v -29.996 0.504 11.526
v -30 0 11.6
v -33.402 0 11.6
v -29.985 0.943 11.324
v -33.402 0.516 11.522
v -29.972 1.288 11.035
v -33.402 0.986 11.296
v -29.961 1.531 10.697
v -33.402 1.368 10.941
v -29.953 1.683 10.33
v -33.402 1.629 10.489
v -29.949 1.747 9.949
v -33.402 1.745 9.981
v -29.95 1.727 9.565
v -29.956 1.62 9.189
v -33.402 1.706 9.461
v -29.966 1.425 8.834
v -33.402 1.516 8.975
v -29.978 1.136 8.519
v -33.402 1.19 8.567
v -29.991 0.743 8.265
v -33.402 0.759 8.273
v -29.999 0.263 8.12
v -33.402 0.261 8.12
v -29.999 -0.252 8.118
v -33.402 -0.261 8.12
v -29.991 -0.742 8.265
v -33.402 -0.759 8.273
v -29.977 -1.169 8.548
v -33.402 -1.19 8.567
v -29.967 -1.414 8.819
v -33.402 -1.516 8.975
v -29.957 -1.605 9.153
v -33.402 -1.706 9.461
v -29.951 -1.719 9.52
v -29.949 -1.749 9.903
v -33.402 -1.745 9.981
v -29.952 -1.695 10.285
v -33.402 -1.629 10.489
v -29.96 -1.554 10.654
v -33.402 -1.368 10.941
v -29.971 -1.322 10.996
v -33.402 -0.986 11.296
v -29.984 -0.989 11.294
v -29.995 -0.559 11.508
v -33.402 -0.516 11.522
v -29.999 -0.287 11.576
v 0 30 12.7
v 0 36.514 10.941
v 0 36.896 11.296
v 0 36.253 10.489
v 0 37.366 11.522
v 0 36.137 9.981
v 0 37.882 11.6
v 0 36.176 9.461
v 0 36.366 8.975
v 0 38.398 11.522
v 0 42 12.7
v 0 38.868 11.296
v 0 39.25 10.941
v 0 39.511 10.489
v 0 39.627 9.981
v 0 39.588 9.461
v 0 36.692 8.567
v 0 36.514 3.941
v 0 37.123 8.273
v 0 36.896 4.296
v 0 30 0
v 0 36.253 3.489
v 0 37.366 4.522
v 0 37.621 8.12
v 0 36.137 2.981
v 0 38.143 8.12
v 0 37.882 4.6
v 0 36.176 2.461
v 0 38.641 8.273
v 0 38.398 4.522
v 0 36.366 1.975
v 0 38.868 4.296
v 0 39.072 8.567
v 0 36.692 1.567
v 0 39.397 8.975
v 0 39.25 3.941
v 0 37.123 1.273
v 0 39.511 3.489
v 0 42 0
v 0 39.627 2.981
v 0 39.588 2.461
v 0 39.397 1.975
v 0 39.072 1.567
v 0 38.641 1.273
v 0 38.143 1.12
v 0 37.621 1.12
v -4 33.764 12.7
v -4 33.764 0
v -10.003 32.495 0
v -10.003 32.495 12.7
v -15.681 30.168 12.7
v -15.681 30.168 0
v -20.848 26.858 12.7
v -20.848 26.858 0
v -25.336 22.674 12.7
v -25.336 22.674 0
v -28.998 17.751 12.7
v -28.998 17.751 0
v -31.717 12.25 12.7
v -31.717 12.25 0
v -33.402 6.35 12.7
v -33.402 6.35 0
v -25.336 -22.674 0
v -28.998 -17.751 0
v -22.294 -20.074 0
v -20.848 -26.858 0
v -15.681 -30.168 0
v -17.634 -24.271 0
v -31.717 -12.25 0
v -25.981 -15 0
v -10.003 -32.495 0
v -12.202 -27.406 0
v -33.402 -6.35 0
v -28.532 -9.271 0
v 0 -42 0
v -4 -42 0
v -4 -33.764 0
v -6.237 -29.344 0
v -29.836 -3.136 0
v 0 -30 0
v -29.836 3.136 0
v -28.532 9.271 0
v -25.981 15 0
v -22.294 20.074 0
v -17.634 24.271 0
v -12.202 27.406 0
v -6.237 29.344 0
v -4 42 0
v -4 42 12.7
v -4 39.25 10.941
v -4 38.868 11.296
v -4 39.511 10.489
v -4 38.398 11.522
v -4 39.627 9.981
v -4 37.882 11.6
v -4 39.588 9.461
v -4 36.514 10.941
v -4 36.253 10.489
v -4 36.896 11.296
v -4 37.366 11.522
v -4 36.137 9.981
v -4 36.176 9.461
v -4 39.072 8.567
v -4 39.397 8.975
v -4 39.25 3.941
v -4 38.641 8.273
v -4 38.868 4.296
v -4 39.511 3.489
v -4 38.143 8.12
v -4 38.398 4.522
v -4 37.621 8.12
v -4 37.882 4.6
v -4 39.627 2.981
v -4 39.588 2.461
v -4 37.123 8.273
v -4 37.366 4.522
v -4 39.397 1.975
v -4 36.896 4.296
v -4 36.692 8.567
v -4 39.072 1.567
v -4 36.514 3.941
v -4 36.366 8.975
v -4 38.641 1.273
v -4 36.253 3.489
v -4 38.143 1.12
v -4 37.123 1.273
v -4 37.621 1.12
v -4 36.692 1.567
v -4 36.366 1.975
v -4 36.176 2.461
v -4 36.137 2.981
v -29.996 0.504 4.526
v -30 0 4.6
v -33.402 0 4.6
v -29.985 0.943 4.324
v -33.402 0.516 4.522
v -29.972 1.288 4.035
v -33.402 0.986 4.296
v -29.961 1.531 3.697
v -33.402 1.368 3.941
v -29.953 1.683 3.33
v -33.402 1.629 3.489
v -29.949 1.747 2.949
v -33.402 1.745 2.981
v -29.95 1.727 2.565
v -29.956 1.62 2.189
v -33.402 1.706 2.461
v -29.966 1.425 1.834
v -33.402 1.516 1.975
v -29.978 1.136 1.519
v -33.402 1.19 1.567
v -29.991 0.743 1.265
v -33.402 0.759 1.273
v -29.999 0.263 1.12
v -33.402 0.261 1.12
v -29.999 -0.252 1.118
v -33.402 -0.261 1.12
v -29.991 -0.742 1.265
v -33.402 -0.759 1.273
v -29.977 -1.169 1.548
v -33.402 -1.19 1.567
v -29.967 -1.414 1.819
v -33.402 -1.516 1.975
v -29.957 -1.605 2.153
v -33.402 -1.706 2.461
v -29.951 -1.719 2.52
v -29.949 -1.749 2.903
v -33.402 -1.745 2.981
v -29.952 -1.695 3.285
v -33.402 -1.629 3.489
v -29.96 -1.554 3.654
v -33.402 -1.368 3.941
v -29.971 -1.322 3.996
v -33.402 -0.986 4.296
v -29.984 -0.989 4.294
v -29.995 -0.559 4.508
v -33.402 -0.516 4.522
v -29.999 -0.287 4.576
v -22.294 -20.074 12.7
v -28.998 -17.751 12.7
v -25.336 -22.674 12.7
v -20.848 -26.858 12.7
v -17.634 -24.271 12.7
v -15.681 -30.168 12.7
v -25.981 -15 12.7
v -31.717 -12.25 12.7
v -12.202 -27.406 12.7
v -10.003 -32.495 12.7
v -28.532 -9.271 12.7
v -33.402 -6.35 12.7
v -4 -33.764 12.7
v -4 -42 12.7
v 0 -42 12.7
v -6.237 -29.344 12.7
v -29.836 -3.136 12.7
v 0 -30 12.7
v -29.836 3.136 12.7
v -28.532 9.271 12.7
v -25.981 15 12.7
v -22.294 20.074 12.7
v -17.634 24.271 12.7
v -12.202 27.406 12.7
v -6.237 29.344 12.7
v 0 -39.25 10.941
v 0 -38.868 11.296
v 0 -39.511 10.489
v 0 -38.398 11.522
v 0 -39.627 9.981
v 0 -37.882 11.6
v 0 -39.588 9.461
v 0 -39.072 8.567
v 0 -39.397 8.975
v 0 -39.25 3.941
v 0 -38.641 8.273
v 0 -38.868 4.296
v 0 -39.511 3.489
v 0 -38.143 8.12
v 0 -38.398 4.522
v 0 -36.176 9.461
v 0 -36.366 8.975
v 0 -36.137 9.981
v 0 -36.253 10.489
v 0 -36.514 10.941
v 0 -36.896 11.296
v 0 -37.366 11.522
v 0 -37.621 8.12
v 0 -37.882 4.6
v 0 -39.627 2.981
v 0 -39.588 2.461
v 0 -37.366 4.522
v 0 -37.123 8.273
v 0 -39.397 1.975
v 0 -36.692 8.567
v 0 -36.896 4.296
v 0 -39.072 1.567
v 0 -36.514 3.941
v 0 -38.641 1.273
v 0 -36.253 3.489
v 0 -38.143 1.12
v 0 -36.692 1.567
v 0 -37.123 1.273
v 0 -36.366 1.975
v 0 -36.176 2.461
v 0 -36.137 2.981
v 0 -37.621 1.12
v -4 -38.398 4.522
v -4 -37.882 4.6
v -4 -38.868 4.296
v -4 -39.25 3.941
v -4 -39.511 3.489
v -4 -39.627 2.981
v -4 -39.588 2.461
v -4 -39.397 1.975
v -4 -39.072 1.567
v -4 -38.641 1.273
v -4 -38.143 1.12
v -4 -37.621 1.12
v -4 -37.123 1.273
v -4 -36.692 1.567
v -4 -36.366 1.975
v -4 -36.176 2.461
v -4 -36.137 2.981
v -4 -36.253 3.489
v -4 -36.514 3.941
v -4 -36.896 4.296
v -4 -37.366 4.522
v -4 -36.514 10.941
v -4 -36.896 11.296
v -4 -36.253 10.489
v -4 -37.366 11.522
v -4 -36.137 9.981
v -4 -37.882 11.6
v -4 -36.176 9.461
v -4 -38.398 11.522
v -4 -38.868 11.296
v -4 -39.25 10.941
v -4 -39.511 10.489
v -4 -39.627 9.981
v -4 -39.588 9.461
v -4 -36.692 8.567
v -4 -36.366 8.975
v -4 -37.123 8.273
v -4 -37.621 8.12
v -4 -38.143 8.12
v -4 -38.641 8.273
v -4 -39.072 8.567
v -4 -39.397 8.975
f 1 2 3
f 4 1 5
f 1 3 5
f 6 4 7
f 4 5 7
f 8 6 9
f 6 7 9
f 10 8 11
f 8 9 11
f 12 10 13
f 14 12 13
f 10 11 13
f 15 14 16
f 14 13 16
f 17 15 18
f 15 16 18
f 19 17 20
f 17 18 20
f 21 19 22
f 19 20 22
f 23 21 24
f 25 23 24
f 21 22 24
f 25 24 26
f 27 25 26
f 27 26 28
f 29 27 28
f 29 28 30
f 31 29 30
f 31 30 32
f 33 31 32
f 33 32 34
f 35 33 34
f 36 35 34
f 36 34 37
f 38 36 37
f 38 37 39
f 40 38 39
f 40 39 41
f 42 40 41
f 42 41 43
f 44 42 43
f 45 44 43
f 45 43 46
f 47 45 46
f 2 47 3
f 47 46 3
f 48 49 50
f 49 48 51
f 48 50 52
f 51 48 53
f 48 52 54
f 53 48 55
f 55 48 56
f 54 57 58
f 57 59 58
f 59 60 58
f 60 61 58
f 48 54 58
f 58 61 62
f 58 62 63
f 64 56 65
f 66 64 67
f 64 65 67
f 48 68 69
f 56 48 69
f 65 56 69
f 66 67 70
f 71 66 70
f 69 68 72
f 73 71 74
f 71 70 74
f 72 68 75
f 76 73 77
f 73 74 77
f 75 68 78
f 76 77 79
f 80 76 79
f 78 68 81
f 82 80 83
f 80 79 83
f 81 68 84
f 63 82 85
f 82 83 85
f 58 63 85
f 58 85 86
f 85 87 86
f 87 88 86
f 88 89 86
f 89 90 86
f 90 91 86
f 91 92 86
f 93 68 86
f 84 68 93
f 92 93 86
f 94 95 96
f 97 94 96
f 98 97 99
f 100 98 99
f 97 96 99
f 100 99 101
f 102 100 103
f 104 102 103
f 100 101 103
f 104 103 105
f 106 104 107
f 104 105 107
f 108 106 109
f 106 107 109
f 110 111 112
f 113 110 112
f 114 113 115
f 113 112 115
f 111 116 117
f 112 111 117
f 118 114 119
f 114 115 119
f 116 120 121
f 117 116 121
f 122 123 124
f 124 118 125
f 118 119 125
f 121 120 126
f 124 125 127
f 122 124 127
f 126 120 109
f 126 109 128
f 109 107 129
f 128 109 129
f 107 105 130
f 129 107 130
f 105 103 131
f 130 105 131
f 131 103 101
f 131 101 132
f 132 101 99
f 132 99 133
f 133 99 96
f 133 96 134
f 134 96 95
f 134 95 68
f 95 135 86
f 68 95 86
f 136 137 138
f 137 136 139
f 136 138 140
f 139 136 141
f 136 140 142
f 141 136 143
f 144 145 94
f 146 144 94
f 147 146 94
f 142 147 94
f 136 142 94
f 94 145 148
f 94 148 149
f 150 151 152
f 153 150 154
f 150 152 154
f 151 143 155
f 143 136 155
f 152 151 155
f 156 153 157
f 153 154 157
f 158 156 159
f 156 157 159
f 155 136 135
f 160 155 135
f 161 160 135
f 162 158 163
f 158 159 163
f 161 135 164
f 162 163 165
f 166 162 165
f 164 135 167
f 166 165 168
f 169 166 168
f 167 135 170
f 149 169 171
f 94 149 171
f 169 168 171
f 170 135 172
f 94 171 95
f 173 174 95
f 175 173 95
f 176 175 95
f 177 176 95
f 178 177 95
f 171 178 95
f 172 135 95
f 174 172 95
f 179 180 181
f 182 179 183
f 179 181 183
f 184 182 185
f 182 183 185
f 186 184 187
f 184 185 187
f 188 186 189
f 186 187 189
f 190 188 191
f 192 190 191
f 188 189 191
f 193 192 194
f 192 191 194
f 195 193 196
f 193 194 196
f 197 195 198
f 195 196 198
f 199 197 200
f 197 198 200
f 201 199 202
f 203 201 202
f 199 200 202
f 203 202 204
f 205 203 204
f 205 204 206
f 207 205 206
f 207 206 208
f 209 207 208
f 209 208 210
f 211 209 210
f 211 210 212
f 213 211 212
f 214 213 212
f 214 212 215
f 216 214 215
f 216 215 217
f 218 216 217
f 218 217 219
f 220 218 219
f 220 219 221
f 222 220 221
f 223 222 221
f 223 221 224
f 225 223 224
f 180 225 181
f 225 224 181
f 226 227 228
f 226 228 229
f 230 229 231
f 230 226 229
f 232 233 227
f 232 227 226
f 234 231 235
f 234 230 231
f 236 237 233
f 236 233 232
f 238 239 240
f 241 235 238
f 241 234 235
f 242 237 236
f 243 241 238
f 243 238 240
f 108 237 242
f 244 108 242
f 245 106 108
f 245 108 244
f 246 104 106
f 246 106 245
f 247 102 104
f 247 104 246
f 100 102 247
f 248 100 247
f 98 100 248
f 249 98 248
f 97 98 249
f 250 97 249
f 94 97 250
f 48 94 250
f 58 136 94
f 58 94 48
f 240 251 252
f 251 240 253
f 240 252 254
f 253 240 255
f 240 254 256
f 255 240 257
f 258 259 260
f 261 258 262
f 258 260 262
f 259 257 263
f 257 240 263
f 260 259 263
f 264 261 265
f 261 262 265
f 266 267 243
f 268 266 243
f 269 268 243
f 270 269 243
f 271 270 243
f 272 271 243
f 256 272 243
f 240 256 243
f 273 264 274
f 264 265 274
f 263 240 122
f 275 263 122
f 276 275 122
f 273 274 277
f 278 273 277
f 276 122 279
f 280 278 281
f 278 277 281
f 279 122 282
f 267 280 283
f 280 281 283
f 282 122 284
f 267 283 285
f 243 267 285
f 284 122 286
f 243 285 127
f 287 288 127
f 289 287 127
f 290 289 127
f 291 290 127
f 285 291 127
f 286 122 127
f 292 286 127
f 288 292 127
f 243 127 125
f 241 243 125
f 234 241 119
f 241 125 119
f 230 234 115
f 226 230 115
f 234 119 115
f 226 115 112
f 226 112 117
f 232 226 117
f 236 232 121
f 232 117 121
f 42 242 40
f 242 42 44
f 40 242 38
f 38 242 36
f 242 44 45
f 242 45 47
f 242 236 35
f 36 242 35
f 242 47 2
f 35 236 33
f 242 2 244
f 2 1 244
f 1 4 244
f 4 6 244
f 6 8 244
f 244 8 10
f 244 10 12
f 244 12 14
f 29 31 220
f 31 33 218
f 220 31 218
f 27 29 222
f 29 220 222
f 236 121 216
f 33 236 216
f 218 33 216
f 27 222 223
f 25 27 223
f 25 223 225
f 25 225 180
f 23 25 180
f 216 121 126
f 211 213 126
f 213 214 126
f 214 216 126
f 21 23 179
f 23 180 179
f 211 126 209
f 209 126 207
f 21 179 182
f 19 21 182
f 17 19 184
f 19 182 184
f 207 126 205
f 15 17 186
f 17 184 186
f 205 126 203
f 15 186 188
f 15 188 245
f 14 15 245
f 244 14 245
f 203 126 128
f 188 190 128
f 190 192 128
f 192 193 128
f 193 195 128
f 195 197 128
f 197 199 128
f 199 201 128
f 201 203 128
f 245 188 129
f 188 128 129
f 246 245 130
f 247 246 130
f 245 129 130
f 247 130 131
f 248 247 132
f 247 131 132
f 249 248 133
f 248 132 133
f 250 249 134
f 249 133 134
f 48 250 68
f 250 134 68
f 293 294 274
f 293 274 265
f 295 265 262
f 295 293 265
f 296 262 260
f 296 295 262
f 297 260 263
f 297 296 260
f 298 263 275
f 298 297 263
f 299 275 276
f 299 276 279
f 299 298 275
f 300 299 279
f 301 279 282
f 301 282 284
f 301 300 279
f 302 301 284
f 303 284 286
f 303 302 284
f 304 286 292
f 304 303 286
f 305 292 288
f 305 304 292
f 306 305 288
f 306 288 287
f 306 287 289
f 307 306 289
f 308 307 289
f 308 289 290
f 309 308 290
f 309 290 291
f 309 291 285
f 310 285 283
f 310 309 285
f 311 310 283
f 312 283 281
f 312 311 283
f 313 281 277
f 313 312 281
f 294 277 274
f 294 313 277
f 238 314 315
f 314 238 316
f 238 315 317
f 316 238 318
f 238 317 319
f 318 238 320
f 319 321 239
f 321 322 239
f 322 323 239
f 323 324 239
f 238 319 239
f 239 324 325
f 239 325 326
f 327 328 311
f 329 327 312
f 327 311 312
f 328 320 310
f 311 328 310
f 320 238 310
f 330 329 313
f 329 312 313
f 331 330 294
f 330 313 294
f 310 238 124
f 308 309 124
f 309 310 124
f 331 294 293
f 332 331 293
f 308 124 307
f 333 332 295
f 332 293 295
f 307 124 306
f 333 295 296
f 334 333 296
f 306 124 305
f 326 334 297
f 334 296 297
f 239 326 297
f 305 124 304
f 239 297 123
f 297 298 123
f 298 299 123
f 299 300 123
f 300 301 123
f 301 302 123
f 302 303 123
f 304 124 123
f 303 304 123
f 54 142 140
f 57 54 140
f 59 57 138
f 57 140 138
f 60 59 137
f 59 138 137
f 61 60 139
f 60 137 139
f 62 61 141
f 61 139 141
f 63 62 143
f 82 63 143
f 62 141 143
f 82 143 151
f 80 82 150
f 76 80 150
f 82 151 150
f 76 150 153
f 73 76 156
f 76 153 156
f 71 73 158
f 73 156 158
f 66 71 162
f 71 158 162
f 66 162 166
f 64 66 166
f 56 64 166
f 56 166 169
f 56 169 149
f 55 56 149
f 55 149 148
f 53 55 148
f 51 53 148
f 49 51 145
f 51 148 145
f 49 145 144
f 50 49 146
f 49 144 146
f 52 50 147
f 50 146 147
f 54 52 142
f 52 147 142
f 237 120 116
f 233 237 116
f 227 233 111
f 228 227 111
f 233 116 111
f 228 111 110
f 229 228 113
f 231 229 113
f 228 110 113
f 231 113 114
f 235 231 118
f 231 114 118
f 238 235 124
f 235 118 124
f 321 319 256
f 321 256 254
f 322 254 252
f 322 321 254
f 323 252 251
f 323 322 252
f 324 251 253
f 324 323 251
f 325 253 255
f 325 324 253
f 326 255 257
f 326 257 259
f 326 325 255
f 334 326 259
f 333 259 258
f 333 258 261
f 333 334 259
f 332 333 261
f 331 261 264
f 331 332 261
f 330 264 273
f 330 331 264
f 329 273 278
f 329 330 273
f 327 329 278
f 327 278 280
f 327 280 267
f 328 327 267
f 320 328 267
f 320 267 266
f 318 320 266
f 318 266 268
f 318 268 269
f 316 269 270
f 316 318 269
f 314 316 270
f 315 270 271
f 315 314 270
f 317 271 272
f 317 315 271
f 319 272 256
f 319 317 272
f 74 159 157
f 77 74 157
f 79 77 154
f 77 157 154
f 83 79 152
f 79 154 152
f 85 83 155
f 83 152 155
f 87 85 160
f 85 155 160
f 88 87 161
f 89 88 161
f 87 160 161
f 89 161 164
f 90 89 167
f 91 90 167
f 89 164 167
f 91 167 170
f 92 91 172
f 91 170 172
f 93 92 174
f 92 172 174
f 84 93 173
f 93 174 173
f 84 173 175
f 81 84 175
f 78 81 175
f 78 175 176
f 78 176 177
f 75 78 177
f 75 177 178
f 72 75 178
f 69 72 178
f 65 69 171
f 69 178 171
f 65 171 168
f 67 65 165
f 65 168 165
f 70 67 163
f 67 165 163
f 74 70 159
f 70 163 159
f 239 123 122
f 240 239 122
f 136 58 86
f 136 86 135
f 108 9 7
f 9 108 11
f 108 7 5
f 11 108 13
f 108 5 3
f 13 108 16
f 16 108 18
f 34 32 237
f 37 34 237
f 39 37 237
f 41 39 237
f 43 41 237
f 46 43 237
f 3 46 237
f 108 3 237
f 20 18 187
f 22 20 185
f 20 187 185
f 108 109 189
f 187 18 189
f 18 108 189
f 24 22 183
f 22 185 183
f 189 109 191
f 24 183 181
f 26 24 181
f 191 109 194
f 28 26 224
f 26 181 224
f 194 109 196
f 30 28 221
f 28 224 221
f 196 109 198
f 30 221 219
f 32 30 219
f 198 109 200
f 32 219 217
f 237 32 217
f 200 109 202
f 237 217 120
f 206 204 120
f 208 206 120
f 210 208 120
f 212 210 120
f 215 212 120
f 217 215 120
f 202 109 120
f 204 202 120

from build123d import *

# Parameters (mm, degrees)
SALIENTE_EXTRUIR1_DEPTH = 12.7
CROQUIS2_R              = 1.75
CORTAR_EXTRUIR1_DEPTH   = 4
CORTAR_EXTRUIR2_REACH   = 35.402
CROQUIS3_R              = 1.75


with BuildPart() as part:
    # Croquis1 → Saliente-Extruir1 (new body)
    with BuildSketch(Plane.XY):
        with BuildLine():
            Line((0, 30), (0, 42))
            Line((0, 42), (-4, 42))
            Line((-4, 42), (-4, 33.763886032))
            ThreePointArc((-4, 33.763886032), (-23.186271363, 24.867585735), (-33.401758936, 6.35))
            Line((-33.401758936, 6.35), (-33.401758936, -6.35))
            ThreePointArc((-33.401758936, -6.35), (-23.186271363, -24.867585735), (-4, -33.763886032))
            Line((-4, -33.763886032), (-4, -42))
            Line((-4, -42), (0, -42))
            Line((0, -42), (0, -30))
            ThreePointArc((0, -30), (-30, 0), (0, 30))
        make_face()
    extrude(amount=SALIENTE_EXTRUIR1_DEPTH)

    # Croquis2 → Cortar-Extruir1 (cut)
    with BuildSketch(Plane.ZY.offset(4)):
        with Locations((2.85, 37.881943016)):
            Circle(CROQUIS2_R)
        with Locations((9.85, 37.881943016)):
            Circle(CROQUIS2_R)
    cortar_extruir1 = extrude(amount=-CORTAR_EXTRUIR1_DEPTH, mode=Mode.SUBTRACT)

    # Simetría1: Cortar-Extruir1 across plane
    add(cortar_extruir1.mirror(Plane.ZX), mode=Mode.SUBTRACT)

    # Croquis3 → Cortar-Extruir2 (cut, up to next)
    with BuildSketch(Plane.ZY.offset(33.401758936), mode=Mode.PRIVATE) as cortar_extruir2_sk1:
        with Locations((2.85, 0)):
            Circle(CROQUIS3_R)
    cortar_extruir2_tool1 = extrude(cortar_extruir2_sk1.sketch, amount=-CORTAR_EXTRUIR2_REACH, mode=Mode.PRIVATE) & part.part
    add(cortar_extruir2_tool1.solids().sort_by_distance((-33.401759, 0, 2.85))[0], mode=Mode.SUBTRACT)
    # Croquis3 → Cortar-Extruir2 (cut, up to next)
    with BuildSketch(Plane.ZY.offset(33.401758936), mode=Mode.PRIVATE) as cortar_extruir2_sk2:
        with Locations((9.85, 0)):
            Circle(CROQUIS3_R)
    cortar_extruir2_tool2 = extrude(cortar_extruir2_sk2.sketch, amount=-CORTAR_EXTRUIR2_REACH, mode=Mode.PRIVATE) & part.part
    add(cortar_extruir2_tool2.solids().sort_by_distance((-33.401759, 0, 9.85))[0], mode=Mode.SUBTRACT)


solid = part.part
